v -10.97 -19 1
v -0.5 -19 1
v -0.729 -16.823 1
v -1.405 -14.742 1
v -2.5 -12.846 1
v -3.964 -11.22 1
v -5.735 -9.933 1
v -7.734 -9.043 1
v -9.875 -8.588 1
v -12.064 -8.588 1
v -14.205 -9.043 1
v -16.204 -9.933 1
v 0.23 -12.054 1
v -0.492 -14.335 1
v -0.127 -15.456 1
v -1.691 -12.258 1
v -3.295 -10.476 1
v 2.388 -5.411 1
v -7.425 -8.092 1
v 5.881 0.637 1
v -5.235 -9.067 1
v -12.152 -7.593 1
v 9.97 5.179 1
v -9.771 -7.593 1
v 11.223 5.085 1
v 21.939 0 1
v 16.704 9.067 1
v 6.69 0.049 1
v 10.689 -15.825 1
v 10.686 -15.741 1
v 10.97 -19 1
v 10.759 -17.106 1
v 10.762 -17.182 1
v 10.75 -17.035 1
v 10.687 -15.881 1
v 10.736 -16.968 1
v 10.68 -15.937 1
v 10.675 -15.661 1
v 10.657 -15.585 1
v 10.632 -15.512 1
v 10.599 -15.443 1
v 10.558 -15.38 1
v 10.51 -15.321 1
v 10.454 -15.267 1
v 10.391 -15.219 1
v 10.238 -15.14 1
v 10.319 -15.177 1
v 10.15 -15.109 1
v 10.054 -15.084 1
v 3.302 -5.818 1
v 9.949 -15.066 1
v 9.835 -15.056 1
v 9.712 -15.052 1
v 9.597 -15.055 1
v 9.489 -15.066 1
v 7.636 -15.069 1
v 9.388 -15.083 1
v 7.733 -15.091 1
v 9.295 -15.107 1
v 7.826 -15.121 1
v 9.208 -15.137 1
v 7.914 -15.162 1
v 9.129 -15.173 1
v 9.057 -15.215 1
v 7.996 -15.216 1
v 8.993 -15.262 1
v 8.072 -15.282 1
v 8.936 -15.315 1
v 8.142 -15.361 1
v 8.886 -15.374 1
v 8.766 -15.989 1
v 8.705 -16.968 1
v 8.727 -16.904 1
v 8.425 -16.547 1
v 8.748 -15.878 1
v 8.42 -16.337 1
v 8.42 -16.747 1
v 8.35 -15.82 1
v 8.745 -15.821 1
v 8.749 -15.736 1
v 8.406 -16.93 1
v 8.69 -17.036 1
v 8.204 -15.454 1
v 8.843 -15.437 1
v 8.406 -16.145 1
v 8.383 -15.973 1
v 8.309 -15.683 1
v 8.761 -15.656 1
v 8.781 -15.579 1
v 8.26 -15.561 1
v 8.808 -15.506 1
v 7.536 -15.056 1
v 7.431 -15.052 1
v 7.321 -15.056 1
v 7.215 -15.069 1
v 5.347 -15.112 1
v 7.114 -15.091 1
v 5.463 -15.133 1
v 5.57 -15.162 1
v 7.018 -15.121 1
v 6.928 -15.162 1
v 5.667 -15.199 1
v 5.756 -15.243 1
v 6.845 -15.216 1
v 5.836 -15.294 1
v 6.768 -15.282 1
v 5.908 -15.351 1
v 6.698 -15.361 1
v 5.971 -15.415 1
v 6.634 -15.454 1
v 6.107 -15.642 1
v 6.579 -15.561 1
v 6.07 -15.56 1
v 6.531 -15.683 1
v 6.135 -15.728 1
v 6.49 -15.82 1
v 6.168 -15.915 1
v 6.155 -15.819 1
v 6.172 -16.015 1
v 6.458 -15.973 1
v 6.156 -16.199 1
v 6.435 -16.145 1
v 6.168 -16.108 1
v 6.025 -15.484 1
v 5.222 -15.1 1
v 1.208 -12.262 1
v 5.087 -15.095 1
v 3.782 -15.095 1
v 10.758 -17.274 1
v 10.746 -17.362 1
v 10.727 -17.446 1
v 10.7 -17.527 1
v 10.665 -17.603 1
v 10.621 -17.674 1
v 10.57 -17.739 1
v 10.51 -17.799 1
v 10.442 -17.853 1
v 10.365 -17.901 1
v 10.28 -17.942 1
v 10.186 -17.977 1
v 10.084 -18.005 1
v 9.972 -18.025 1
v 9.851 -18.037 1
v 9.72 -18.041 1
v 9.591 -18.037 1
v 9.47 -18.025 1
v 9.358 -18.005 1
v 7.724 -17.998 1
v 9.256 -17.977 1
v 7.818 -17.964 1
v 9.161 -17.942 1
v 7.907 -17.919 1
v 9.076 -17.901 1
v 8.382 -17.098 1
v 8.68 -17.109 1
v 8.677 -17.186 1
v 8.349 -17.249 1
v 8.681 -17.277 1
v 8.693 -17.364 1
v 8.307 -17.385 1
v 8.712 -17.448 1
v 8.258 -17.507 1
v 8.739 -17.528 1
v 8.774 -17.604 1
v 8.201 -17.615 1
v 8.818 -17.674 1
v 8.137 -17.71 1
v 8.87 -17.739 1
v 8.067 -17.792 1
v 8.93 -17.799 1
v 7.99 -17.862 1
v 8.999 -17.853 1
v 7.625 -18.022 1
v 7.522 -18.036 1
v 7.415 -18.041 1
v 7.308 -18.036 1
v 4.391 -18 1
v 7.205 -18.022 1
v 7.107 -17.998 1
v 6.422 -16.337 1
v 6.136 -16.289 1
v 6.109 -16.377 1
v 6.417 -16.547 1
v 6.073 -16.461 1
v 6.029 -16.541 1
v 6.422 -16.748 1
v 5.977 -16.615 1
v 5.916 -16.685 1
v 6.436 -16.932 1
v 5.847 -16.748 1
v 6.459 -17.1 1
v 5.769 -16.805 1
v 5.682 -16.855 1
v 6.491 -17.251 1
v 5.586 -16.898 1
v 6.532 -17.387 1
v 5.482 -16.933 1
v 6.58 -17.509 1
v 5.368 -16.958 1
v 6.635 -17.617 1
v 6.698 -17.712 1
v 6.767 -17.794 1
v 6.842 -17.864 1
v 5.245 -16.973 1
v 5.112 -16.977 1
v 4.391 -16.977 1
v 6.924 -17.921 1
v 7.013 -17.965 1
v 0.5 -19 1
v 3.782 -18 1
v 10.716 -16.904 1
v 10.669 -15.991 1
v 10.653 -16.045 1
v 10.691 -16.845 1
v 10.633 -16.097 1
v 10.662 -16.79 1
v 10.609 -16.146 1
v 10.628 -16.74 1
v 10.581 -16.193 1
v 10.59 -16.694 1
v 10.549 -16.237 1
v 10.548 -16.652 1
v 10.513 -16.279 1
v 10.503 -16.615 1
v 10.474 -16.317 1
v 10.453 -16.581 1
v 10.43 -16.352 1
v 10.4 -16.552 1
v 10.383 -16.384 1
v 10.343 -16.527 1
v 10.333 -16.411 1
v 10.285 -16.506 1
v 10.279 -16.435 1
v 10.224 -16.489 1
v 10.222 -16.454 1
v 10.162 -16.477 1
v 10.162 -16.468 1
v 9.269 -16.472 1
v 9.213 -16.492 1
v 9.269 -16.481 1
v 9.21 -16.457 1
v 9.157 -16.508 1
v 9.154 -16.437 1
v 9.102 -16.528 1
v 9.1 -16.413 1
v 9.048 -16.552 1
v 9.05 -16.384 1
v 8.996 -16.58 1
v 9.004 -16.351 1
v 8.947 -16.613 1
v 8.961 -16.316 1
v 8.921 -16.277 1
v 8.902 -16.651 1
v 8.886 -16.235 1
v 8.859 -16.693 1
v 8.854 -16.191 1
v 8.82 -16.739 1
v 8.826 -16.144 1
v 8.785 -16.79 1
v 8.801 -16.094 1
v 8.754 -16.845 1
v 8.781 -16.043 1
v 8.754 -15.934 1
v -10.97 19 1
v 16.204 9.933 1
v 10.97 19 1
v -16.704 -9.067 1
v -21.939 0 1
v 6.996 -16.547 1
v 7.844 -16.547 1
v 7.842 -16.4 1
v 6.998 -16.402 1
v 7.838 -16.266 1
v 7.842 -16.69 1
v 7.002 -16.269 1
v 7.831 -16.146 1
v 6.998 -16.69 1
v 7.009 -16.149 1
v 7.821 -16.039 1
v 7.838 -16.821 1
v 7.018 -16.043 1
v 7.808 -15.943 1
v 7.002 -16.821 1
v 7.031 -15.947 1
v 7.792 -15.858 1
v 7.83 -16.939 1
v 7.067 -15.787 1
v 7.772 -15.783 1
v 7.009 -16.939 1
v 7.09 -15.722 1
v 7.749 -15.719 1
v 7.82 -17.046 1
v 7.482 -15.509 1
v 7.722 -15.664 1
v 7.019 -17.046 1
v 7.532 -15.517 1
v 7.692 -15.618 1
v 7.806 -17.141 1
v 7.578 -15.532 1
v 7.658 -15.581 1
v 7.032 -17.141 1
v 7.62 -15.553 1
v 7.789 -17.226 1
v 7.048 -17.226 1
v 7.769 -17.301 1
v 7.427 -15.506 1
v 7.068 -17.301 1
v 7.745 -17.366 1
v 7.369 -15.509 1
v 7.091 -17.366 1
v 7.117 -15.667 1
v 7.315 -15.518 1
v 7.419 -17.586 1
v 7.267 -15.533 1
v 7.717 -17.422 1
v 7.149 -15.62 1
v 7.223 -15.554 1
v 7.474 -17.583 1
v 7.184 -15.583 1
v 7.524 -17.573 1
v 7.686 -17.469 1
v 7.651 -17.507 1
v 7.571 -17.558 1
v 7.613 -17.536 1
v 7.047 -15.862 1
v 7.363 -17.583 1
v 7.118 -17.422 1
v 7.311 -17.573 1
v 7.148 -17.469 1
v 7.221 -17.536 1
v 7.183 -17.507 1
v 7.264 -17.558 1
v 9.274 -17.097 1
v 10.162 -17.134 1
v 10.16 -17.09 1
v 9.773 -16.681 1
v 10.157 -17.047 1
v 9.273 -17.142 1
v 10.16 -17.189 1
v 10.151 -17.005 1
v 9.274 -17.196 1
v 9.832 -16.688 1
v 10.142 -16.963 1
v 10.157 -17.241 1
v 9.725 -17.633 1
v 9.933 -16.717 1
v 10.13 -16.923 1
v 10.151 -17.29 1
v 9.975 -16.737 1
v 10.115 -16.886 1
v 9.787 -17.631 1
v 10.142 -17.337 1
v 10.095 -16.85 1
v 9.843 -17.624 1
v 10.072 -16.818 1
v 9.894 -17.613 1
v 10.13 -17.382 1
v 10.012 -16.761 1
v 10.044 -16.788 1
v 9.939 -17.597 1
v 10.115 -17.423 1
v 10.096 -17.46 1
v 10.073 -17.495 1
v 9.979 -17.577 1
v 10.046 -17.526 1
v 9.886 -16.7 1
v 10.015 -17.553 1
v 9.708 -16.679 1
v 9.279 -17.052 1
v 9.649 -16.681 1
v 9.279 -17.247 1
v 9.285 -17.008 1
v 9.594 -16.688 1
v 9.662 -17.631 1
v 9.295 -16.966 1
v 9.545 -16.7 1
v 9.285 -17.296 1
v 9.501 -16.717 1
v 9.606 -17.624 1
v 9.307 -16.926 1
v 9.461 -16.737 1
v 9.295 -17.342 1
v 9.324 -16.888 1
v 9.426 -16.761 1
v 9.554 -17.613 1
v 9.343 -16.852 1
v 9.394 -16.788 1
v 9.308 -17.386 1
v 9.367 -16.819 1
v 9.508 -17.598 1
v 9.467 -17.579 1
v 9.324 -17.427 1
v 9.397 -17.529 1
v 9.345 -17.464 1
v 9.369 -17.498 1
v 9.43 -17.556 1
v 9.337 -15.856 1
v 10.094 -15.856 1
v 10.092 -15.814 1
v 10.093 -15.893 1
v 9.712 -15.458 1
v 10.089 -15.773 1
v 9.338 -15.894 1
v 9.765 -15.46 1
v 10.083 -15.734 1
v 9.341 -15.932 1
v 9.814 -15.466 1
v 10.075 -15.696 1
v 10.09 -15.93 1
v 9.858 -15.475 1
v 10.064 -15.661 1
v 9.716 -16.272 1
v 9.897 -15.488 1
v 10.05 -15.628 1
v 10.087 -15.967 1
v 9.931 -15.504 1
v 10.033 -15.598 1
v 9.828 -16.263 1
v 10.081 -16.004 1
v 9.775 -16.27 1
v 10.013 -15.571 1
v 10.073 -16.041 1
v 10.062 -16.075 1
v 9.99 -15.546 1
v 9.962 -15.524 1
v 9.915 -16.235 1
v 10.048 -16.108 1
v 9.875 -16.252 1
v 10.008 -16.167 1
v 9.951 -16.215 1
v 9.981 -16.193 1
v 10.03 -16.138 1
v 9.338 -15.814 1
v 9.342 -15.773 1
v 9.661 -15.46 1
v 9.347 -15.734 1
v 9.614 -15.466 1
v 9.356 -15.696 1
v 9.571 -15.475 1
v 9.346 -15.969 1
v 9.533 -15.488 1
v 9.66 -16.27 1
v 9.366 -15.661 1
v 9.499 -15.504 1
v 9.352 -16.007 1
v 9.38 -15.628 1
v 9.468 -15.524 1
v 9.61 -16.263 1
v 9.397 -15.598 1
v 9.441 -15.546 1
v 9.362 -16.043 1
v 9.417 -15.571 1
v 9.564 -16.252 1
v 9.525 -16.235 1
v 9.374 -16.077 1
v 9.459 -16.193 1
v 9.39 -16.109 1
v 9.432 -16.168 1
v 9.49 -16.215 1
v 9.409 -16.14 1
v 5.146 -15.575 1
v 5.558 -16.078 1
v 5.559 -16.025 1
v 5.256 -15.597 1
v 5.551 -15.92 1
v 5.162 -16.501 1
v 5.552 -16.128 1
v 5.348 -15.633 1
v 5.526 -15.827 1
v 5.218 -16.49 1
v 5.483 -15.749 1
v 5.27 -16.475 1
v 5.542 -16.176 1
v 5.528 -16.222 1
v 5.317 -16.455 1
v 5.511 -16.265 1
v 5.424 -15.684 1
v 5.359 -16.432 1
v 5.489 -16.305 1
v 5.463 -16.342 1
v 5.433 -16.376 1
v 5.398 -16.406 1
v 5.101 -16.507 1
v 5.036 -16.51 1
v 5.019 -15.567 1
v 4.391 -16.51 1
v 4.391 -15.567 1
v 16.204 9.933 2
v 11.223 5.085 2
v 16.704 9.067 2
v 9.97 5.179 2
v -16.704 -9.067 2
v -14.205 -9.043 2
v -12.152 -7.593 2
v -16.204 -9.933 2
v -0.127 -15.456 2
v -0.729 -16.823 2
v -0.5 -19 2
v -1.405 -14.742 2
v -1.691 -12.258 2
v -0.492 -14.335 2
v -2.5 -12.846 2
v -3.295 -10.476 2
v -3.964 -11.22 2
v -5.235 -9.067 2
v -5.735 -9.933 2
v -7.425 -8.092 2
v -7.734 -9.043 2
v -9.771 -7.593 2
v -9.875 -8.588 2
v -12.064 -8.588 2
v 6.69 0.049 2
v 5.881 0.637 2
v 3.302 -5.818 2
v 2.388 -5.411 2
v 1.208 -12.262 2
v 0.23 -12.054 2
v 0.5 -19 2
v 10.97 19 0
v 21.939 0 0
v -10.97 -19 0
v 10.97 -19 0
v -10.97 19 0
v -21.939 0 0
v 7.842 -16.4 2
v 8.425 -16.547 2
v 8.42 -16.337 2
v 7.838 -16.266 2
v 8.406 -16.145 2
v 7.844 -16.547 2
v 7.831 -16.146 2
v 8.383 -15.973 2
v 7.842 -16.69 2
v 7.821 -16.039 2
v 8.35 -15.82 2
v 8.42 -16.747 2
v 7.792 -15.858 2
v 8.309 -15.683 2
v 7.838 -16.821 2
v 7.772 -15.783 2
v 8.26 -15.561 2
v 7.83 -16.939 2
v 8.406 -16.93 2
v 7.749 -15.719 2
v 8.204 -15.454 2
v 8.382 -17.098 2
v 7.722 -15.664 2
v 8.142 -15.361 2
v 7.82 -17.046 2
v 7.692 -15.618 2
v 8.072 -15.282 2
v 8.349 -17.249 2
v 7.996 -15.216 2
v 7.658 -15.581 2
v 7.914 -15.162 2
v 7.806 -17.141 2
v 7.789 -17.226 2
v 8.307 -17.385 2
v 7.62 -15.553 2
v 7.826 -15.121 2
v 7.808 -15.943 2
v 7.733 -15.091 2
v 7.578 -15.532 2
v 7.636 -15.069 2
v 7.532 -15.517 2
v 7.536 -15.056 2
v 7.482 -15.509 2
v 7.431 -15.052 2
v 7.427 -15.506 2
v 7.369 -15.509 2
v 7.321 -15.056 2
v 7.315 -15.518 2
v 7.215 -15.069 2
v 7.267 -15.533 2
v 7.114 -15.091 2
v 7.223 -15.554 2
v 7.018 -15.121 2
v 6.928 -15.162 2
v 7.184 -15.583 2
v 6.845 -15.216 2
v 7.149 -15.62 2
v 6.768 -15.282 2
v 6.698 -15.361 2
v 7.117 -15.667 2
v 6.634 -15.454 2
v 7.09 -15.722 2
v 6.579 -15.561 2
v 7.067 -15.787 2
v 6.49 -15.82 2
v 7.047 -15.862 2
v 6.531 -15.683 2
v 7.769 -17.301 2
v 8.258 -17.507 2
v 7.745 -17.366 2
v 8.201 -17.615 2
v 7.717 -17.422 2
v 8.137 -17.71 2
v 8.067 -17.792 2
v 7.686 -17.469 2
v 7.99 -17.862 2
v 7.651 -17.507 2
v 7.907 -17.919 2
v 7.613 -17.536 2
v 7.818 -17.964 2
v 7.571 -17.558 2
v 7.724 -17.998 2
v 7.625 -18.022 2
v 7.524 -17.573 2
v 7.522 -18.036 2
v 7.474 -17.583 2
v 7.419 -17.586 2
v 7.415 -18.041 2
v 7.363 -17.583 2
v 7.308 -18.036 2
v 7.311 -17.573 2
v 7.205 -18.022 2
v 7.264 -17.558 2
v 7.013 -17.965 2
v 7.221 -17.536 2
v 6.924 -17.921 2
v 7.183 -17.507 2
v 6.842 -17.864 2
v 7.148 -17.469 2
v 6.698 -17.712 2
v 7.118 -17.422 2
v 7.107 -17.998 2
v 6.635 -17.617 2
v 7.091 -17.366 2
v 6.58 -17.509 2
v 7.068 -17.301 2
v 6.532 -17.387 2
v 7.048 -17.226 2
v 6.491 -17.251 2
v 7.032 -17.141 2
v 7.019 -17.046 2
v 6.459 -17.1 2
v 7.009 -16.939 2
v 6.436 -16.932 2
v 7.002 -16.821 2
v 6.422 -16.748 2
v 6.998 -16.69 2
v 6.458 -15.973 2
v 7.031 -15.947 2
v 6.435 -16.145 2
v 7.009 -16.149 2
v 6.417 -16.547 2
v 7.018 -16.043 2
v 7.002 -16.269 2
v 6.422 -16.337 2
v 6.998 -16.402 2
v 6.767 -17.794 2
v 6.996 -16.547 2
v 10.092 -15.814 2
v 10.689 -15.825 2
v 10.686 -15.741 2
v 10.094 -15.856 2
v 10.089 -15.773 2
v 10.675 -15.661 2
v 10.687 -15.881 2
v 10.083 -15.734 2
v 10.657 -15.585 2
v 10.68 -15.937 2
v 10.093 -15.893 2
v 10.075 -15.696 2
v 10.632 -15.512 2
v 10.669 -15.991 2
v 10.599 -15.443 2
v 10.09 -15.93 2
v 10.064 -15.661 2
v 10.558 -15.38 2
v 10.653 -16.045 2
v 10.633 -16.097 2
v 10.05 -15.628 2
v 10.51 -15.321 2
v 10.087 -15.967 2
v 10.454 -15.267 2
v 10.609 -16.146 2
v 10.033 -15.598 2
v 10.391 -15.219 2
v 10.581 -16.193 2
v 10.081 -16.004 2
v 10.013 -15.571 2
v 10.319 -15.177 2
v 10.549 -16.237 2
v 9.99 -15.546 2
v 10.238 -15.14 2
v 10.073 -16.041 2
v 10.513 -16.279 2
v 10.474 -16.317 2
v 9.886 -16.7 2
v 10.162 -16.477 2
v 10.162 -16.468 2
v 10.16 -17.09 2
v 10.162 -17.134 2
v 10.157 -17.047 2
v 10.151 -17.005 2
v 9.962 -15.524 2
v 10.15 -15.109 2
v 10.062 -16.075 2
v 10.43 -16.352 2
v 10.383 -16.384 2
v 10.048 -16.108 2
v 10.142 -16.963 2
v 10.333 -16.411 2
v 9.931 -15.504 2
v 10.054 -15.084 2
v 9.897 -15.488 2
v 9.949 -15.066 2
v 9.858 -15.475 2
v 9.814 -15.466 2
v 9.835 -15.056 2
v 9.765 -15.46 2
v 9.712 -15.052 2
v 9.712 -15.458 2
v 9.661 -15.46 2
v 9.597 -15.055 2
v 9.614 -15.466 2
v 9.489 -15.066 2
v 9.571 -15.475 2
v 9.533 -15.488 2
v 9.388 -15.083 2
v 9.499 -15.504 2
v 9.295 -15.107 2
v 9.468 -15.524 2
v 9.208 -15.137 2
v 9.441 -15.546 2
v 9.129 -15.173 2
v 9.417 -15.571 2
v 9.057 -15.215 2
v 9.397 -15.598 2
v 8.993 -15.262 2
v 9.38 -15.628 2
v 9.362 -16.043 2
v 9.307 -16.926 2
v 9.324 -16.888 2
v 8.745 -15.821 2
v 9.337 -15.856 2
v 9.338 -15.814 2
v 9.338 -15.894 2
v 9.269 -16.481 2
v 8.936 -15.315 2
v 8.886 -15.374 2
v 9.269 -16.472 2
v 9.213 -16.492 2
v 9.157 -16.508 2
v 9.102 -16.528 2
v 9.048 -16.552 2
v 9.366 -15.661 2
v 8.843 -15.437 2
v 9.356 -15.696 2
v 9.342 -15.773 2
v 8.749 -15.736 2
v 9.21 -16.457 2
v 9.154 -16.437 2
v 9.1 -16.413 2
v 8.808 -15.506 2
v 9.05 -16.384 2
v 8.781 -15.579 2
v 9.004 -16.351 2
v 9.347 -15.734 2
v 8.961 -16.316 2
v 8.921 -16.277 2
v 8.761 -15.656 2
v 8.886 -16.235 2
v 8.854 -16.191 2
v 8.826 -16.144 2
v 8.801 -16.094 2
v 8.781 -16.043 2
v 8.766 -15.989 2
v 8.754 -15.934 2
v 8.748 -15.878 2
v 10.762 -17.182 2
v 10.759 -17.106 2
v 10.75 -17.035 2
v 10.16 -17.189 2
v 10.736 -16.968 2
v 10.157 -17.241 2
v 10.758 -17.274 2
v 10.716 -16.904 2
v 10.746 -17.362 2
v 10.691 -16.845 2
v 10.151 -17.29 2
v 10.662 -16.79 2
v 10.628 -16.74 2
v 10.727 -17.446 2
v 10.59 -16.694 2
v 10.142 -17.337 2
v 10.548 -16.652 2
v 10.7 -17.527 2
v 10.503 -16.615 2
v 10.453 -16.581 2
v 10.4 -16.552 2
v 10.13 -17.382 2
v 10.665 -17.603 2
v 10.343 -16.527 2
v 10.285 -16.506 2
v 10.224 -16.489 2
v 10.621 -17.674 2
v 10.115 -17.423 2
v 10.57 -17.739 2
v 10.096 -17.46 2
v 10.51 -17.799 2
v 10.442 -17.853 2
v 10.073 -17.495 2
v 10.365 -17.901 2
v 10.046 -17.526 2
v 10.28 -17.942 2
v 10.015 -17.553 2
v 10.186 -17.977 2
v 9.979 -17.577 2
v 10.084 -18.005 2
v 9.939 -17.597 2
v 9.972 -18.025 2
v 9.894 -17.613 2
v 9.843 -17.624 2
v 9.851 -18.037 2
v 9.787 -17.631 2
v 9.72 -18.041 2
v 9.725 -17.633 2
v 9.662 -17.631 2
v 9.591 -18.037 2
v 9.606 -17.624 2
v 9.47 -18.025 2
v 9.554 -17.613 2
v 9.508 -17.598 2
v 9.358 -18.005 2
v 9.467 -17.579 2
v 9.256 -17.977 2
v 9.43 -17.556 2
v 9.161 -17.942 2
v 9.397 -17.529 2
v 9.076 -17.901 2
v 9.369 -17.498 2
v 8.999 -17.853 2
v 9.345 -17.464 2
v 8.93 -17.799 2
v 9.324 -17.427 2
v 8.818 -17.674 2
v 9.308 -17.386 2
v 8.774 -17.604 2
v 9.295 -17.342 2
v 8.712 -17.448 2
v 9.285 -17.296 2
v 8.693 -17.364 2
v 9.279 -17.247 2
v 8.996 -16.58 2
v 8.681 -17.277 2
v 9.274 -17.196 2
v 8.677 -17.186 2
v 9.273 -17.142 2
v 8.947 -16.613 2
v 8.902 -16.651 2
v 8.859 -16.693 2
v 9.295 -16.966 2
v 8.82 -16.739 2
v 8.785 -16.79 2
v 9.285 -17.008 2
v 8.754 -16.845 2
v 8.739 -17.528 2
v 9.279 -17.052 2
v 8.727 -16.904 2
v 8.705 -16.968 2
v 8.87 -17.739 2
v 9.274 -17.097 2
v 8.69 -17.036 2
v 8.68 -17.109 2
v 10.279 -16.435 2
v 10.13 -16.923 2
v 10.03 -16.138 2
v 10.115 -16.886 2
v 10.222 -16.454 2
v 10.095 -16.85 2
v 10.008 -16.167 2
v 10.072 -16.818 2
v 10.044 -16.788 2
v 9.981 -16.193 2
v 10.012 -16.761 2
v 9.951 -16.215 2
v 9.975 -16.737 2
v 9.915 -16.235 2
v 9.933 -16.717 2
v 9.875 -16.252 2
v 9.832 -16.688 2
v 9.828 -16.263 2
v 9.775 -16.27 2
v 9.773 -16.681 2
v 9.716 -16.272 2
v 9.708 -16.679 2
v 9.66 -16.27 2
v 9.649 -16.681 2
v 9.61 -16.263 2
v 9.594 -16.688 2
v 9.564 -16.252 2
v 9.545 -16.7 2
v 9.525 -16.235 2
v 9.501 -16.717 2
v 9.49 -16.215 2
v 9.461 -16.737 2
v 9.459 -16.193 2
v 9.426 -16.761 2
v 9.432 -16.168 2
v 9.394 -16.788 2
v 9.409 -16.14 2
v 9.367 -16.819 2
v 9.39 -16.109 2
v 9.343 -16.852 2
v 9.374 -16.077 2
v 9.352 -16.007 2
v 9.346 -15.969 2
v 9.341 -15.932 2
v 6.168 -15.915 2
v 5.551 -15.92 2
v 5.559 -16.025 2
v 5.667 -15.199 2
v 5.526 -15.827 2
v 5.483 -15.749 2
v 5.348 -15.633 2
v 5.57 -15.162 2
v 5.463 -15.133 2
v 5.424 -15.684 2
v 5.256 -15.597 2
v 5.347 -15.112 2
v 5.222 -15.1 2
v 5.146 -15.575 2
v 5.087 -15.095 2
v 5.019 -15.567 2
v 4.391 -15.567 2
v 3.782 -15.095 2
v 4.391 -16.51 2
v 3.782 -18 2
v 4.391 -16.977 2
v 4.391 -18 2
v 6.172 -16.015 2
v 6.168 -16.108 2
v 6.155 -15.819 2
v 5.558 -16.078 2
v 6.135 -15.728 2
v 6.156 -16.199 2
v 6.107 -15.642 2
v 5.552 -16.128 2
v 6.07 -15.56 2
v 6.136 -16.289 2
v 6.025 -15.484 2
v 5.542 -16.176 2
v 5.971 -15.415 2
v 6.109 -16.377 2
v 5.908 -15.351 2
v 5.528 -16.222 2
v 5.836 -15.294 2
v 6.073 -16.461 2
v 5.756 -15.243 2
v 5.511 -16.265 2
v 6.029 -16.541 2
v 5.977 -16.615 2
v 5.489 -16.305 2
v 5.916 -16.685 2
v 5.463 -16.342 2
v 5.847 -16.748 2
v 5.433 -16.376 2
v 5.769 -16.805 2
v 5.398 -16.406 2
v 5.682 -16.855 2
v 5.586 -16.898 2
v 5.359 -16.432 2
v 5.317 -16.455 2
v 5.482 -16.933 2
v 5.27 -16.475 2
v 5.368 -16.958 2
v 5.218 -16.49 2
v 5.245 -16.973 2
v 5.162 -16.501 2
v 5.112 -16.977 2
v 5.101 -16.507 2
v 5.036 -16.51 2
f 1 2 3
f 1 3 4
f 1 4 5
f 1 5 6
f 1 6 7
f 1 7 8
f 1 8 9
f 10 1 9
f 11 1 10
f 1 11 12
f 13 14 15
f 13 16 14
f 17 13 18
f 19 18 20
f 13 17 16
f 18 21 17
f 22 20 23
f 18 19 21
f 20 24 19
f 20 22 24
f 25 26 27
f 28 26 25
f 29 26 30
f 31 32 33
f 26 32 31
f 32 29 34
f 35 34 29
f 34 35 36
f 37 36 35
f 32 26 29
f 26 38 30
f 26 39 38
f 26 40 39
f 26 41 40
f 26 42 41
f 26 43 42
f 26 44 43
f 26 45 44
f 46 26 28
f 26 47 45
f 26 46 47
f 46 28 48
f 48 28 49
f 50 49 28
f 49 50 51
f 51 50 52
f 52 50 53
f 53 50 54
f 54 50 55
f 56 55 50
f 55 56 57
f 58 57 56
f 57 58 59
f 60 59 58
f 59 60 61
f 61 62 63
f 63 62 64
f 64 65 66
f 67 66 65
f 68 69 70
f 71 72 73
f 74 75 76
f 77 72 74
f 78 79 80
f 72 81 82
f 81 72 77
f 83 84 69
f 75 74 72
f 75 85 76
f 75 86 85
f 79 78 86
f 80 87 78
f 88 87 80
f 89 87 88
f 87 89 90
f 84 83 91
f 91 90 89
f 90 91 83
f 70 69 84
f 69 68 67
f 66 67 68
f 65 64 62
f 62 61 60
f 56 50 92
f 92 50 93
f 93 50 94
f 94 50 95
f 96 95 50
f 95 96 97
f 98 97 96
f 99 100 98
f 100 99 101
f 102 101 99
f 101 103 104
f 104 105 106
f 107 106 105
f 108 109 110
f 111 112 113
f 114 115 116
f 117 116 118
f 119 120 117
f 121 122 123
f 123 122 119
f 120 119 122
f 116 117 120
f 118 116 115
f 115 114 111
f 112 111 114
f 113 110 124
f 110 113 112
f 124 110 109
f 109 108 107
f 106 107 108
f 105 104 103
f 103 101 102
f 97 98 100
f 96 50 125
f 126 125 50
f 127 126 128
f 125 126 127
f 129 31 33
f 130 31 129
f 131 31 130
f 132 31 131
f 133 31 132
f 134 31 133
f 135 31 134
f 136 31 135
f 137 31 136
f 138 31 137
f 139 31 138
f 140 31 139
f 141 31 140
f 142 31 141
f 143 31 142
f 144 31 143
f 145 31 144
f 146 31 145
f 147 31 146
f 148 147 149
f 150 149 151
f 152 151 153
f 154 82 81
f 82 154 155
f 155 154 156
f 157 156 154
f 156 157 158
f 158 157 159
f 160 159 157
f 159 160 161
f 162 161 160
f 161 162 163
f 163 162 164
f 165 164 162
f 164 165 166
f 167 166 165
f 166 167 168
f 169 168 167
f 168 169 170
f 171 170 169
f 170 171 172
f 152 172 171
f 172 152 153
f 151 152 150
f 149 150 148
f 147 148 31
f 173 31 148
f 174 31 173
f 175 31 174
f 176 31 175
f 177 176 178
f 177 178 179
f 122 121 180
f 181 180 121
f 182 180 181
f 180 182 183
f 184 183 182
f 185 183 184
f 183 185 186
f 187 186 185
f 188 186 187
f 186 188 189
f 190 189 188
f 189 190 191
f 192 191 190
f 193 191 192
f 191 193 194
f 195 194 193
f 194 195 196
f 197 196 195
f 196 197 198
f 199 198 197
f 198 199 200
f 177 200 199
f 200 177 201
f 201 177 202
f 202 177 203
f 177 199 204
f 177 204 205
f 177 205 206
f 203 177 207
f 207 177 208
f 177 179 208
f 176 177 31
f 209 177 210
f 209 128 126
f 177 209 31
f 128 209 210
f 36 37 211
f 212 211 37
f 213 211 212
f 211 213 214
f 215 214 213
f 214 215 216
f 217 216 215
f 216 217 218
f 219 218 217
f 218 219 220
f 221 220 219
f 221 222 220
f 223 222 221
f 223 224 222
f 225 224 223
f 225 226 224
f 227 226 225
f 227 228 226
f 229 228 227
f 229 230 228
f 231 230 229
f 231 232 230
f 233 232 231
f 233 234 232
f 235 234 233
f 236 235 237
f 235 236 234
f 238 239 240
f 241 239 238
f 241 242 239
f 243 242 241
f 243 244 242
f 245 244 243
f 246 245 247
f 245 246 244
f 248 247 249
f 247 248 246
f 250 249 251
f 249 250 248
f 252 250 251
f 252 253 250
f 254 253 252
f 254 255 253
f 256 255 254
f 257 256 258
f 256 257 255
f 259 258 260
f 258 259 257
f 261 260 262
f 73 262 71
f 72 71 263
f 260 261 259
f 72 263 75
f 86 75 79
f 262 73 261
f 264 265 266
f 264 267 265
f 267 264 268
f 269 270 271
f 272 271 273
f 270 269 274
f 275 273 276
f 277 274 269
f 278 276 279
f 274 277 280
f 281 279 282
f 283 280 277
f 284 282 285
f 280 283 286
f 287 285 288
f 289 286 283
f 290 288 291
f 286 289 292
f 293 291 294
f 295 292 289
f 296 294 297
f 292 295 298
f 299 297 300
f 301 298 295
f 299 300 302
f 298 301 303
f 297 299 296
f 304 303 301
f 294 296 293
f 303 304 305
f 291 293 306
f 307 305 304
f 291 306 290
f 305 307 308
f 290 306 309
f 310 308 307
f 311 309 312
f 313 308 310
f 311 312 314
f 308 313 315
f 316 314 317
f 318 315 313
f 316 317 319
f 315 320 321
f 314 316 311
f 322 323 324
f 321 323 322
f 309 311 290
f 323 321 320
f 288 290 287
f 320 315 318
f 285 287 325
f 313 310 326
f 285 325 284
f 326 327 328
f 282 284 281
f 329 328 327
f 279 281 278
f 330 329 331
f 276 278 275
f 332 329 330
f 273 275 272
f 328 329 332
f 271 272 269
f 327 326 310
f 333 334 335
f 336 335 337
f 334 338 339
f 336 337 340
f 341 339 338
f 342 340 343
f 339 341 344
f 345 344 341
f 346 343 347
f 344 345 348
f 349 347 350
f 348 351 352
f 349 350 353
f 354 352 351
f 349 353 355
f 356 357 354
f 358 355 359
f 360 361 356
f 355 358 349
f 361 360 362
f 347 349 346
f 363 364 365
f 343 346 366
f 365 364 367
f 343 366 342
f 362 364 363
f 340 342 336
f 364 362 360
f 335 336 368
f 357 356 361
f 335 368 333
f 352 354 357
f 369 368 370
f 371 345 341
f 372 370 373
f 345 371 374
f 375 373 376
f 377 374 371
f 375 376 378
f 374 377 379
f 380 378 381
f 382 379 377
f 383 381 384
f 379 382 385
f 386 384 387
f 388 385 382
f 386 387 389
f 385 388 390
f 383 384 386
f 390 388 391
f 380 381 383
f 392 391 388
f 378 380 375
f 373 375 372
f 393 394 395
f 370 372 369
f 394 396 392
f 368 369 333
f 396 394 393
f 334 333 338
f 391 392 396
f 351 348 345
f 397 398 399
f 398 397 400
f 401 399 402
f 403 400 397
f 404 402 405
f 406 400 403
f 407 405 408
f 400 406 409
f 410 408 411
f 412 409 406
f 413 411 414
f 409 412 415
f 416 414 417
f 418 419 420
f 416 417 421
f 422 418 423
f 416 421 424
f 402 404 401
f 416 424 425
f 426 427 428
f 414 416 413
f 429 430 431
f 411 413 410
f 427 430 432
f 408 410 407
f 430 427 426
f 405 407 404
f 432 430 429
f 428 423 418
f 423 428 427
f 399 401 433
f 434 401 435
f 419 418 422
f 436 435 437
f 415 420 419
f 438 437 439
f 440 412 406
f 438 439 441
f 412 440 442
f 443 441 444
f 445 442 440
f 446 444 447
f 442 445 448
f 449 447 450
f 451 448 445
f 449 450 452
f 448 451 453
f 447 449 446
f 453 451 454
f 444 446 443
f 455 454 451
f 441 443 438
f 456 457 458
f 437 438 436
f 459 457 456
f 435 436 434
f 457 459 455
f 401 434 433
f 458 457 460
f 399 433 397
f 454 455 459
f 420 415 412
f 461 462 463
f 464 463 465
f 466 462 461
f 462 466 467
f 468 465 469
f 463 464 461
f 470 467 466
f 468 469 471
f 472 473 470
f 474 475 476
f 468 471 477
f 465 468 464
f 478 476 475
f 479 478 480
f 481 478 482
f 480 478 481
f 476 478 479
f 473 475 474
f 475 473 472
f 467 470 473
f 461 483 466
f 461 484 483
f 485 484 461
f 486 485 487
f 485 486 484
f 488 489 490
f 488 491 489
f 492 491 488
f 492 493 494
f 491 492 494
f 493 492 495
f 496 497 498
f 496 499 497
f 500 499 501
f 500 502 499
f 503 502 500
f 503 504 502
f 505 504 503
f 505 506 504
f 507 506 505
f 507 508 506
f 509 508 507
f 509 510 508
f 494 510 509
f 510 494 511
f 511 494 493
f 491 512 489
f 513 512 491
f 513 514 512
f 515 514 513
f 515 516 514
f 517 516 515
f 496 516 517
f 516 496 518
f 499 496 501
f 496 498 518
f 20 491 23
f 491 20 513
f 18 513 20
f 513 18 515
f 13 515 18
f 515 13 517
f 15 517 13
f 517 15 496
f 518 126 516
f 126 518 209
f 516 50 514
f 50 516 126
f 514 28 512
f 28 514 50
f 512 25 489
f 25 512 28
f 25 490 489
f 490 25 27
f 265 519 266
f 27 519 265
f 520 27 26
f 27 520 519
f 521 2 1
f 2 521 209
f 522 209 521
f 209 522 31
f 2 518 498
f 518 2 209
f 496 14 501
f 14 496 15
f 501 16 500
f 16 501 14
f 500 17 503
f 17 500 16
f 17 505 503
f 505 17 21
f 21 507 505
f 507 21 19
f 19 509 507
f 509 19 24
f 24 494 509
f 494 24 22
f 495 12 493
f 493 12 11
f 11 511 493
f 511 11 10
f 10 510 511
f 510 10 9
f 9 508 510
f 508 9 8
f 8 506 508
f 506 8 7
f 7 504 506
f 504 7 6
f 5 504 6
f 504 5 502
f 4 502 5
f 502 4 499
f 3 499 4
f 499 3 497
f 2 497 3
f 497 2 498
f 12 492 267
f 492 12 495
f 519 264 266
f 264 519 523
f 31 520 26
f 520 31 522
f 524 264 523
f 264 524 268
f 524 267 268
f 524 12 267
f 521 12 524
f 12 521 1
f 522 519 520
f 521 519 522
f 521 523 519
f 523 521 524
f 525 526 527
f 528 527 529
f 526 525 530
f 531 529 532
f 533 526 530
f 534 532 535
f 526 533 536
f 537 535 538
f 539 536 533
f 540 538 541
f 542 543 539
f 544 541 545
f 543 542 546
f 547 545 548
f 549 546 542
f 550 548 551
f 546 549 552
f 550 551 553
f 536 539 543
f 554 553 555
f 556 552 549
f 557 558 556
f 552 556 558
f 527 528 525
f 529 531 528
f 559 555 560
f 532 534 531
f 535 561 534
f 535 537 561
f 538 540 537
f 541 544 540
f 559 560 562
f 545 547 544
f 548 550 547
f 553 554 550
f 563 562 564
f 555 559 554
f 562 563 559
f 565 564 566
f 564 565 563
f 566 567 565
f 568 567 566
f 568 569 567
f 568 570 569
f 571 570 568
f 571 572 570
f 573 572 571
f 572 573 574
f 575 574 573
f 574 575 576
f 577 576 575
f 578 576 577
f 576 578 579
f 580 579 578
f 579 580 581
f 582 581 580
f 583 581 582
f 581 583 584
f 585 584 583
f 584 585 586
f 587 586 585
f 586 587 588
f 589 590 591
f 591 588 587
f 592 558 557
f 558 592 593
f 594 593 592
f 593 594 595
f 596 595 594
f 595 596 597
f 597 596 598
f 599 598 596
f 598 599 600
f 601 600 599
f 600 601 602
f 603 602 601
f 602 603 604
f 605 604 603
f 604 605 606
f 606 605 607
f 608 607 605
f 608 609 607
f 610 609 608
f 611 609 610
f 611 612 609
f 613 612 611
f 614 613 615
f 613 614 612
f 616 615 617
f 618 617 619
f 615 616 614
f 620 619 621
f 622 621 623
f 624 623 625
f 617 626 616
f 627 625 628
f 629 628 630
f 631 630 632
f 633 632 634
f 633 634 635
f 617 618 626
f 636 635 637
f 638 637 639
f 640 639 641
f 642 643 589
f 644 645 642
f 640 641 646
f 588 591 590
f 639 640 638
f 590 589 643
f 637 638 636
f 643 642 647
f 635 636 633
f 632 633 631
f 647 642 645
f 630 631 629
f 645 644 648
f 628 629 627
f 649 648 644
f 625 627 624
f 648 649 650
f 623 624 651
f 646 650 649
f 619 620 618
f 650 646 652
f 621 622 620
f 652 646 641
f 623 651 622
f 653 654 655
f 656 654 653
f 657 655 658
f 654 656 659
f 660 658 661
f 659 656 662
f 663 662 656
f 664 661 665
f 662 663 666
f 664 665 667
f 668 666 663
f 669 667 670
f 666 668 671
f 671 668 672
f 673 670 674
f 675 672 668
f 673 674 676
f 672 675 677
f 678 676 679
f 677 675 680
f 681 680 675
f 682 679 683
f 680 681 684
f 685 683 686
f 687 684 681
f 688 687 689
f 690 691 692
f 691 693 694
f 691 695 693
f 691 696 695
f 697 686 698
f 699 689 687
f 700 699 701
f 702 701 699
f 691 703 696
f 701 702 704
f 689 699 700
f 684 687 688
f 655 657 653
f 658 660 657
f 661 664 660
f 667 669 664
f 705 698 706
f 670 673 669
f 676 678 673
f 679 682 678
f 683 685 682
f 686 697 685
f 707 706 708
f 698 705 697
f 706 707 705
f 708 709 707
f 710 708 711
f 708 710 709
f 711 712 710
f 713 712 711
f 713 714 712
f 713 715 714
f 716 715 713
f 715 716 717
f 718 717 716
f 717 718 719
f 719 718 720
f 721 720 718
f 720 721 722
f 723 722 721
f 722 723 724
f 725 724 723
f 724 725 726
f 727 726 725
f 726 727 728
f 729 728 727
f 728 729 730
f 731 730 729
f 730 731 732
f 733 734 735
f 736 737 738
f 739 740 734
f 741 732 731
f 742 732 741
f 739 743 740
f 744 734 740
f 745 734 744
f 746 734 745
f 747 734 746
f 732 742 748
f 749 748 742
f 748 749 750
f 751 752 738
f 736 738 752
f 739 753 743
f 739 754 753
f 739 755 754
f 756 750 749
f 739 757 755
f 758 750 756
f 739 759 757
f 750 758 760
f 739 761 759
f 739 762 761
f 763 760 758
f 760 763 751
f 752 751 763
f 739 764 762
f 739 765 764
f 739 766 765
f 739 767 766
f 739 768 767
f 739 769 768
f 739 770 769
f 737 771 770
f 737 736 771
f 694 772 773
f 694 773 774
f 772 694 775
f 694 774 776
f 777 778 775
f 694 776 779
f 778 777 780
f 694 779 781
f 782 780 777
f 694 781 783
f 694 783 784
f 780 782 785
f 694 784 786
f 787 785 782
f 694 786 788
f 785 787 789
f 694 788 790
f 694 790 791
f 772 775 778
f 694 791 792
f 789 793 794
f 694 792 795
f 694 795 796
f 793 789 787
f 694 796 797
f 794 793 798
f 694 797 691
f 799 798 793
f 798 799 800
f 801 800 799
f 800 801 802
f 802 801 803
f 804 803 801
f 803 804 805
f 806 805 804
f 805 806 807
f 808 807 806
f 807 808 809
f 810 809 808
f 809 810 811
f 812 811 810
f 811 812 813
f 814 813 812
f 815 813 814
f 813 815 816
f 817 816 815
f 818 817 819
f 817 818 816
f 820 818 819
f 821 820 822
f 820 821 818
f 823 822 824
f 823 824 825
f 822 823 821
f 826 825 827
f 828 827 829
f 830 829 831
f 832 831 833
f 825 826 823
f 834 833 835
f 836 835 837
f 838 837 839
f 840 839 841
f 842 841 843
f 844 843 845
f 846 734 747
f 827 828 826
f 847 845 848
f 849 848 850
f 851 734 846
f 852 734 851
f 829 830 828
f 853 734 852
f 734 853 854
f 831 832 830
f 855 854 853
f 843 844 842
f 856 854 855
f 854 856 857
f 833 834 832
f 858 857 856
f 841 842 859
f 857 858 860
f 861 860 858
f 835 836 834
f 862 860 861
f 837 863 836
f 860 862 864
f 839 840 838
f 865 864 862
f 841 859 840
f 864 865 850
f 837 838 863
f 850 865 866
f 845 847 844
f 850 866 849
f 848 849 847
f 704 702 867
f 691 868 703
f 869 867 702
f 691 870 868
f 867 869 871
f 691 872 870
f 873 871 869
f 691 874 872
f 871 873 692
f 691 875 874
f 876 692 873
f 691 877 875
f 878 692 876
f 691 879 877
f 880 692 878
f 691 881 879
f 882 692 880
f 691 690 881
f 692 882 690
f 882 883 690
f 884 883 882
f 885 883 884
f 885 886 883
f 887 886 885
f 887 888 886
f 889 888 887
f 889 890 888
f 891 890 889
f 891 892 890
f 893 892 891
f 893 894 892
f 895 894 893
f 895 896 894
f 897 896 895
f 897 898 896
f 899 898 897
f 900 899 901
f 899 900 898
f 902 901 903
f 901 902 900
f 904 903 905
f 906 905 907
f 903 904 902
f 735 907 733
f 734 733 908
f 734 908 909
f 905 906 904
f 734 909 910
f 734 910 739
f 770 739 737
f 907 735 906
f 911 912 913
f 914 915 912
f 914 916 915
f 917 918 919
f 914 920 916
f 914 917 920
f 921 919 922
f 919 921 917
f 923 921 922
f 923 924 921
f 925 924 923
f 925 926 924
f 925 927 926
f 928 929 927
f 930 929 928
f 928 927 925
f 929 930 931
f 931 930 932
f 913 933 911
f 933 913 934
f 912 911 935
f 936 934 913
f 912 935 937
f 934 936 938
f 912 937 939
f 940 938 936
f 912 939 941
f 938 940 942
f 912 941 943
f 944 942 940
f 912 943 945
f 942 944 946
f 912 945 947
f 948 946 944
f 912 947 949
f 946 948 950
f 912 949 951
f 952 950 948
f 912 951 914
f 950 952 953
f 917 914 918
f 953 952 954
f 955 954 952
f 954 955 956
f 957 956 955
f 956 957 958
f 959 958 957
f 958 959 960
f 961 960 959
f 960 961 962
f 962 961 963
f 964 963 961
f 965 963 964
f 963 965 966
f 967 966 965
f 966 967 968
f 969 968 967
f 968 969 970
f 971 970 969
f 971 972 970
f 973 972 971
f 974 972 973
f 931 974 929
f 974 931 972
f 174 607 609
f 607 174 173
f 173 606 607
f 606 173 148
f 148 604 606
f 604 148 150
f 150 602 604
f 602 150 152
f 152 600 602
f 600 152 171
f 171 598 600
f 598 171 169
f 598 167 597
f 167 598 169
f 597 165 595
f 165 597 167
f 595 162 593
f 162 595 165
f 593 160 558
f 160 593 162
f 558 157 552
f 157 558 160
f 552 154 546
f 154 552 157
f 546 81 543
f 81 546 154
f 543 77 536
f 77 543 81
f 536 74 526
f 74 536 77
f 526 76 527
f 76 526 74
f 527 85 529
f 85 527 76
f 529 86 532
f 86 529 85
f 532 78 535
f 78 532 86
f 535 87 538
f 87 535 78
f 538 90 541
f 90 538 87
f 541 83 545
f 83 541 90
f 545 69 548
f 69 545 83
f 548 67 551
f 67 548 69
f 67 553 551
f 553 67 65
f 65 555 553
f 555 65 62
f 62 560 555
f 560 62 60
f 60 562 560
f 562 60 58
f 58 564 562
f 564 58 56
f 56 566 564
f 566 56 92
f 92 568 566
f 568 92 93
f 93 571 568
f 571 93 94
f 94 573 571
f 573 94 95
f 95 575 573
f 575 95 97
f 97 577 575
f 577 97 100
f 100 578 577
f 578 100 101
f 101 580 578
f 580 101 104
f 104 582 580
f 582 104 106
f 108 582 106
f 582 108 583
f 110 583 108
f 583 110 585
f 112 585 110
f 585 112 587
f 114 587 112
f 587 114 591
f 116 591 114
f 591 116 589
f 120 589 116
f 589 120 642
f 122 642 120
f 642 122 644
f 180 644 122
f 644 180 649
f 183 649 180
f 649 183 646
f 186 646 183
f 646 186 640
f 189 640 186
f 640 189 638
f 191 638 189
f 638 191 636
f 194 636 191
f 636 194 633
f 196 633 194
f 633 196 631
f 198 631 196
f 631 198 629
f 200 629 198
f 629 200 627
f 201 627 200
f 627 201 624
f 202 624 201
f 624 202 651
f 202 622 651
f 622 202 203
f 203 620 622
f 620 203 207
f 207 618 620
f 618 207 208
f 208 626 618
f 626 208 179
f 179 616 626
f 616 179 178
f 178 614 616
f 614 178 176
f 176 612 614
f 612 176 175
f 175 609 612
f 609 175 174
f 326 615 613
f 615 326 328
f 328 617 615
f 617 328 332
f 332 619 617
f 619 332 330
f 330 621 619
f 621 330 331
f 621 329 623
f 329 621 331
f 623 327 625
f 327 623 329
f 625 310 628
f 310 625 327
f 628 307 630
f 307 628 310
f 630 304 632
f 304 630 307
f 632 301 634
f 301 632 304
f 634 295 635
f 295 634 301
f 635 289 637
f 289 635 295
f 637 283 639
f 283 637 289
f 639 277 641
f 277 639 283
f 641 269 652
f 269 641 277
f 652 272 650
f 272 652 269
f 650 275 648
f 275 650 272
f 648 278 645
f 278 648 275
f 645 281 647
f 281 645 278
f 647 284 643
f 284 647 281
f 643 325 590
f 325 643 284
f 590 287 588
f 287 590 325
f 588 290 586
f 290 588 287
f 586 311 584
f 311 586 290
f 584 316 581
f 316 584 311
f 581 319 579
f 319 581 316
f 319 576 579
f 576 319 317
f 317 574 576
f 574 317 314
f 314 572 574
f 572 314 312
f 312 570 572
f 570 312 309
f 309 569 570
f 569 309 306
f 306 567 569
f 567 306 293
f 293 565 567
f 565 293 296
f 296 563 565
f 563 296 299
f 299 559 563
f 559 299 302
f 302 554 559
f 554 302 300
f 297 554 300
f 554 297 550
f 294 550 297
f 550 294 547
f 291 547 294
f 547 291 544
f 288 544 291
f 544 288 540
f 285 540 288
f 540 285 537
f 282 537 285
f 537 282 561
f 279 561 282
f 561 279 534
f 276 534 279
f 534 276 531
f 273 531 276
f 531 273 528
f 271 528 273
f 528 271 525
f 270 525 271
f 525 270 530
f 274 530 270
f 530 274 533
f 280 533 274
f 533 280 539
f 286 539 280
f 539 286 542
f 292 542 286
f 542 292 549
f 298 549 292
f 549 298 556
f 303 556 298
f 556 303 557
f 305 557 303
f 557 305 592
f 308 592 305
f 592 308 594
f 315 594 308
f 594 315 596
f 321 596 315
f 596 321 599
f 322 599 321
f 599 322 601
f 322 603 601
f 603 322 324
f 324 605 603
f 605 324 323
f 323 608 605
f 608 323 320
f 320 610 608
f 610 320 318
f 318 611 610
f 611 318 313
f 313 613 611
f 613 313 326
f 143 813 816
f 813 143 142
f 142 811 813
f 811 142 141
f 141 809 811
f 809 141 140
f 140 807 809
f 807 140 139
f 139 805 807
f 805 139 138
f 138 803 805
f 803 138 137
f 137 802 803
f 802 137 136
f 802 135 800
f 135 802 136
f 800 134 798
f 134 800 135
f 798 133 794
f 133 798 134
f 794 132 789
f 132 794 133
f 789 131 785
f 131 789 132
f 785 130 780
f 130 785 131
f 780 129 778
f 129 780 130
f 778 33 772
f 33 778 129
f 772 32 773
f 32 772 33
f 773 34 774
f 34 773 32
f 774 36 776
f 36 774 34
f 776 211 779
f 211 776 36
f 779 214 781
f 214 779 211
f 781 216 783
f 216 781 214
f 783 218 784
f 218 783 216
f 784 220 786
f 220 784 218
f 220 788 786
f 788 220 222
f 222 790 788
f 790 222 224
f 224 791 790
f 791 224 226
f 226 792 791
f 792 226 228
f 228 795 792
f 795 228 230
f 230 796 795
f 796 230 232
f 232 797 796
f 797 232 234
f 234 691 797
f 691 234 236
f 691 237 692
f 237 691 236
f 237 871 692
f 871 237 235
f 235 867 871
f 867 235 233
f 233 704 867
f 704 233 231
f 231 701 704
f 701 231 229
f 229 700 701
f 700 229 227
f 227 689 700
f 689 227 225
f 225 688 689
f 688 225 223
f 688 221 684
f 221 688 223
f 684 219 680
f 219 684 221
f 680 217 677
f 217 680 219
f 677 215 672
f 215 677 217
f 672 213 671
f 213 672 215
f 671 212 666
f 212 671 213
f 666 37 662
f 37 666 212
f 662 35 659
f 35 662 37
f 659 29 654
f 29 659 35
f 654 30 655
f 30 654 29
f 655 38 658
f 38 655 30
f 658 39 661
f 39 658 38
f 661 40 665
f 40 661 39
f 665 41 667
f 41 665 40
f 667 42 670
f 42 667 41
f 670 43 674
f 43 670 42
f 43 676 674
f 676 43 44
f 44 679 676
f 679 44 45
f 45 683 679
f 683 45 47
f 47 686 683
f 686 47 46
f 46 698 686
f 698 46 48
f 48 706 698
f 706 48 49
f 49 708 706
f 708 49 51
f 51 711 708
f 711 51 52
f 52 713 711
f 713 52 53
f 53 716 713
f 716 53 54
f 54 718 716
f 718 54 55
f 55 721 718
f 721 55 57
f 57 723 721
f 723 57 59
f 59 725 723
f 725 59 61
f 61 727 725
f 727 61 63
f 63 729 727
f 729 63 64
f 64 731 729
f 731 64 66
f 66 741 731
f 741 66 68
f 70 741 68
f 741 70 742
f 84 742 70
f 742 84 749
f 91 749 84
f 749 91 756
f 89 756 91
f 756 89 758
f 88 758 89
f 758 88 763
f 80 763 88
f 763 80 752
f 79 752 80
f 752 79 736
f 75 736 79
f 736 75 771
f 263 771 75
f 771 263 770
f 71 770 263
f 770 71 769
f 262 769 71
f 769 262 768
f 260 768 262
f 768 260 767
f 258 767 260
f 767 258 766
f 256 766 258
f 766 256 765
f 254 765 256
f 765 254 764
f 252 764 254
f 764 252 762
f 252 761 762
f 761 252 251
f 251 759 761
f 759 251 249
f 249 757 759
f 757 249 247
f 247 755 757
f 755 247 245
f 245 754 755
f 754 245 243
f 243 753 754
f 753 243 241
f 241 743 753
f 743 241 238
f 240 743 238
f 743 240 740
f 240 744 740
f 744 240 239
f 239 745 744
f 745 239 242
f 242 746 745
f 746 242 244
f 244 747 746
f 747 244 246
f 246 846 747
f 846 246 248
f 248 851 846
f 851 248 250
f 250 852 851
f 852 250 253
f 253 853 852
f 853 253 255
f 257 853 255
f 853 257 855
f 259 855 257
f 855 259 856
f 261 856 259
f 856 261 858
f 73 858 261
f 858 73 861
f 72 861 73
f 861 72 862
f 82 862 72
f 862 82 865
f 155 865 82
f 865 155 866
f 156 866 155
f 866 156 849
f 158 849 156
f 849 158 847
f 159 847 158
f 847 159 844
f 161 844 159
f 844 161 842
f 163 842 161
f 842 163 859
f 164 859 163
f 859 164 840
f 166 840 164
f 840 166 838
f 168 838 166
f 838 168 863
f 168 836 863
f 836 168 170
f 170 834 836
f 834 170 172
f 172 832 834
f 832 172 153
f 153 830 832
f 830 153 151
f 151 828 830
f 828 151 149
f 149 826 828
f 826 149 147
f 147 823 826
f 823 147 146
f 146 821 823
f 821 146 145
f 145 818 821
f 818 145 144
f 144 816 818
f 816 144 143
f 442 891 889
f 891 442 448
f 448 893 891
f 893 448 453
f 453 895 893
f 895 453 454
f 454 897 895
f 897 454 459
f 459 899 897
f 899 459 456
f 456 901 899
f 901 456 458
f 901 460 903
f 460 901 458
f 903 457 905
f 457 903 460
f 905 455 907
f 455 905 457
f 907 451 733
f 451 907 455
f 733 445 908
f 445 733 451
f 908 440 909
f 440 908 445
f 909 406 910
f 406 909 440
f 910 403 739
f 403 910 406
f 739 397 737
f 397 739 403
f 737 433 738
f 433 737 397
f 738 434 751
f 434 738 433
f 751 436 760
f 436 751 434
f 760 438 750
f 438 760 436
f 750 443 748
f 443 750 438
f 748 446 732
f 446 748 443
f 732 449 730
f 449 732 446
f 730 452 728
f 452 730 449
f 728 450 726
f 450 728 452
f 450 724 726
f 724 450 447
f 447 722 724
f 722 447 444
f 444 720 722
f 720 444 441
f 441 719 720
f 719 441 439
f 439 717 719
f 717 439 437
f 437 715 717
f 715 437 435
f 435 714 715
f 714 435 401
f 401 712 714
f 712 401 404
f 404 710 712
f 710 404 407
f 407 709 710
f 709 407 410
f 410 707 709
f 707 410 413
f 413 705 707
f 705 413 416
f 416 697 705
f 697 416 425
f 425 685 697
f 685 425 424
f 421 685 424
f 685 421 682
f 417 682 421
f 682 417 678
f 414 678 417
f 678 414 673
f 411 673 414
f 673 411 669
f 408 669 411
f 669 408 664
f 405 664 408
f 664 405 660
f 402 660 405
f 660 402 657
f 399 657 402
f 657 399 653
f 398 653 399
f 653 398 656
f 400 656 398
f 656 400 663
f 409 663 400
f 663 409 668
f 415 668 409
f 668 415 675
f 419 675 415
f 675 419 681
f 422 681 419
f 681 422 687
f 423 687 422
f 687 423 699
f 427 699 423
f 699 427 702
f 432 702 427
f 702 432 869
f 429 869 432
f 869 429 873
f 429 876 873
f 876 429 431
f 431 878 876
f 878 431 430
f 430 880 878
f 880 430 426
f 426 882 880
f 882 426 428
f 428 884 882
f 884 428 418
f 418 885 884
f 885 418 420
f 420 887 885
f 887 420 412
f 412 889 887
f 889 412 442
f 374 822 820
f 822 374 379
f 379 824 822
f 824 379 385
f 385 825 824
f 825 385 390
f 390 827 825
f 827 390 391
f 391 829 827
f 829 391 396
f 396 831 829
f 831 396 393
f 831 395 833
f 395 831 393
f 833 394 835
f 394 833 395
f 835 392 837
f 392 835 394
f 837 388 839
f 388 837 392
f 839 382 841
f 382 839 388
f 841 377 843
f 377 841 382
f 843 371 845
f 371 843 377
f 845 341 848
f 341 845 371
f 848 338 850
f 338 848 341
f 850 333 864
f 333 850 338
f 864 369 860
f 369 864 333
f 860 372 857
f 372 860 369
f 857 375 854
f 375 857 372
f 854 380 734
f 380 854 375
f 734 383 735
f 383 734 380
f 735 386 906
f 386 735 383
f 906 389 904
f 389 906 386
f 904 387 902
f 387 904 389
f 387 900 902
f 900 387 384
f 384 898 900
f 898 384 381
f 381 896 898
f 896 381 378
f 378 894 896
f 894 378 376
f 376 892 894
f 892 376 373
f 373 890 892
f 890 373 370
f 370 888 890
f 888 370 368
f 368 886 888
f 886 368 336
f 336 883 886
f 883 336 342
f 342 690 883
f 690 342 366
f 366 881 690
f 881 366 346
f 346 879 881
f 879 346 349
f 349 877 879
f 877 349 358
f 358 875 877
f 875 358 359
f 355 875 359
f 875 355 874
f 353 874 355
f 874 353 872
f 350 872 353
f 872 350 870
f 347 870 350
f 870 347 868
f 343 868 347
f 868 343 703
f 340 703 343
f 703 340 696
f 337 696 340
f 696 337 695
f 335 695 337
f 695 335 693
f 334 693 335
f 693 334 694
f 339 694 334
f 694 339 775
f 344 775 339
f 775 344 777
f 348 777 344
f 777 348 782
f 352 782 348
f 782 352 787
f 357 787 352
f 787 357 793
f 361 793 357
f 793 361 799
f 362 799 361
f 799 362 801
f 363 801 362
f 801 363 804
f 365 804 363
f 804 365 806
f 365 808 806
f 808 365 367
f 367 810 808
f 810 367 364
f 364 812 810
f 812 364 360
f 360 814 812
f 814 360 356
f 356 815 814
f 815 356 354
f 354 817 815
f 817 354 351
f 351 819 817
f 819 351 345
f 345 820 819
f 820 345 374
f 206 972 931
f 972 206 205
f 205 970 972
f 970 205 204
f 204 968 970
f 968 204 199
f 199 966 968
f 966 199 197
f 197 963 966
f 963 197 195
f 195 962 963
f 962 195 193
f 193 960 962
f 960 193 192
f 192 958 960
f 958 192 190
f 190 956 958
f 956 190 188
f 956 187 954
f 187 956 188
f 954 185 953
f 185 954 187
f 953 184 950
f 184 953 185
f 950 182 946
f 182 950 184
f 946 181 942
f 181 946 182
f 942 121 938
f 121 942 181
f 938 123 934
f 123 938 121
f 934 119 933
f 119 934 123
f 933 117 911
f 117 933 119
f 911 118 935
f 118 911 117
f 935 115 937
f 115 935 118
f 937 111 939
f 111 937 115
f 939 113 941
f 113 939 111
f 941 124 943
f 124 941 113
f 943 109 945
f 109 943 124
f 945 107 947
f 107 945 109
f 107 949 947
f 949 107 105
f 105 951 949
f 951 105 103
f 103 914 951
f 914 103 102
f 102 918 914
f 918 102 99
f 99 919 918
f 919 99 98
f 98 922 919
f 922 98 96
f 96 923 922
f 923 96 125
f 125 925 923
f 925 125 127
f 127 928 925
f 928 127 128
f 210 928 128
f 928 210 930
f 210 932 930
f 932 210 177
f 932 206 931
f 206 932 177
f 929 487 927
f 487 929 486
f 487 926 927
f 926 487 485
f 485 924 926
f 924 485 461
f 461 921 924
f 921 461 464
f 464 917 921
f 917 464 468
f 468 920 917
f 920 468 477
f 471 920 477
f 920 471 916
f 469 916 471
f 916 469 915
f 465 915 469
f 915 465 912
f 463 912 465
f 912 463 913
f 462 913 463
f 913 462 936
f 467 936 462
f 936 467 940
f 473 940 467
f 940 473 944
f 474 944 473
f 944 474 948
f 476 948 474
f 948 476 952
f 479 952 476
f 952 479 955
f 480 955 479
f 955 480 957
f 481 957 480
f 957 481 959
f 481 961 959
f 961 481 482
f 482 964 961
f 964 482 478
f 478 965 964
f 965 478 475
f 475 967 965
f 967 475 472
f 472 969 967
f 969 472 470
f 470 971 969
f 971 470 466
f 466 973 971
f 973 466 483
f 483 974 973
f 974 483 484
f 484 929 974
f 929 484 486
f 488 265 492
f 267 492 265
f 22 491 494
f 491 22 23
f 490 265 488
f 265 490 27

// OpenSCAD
include <../../Scripts/18xx tiles basic functions.scad>
hex("blue");
put_tilenr("P08");
light_curve(r=0);
sharp_curve(r=5);
straight_line(r=2);
